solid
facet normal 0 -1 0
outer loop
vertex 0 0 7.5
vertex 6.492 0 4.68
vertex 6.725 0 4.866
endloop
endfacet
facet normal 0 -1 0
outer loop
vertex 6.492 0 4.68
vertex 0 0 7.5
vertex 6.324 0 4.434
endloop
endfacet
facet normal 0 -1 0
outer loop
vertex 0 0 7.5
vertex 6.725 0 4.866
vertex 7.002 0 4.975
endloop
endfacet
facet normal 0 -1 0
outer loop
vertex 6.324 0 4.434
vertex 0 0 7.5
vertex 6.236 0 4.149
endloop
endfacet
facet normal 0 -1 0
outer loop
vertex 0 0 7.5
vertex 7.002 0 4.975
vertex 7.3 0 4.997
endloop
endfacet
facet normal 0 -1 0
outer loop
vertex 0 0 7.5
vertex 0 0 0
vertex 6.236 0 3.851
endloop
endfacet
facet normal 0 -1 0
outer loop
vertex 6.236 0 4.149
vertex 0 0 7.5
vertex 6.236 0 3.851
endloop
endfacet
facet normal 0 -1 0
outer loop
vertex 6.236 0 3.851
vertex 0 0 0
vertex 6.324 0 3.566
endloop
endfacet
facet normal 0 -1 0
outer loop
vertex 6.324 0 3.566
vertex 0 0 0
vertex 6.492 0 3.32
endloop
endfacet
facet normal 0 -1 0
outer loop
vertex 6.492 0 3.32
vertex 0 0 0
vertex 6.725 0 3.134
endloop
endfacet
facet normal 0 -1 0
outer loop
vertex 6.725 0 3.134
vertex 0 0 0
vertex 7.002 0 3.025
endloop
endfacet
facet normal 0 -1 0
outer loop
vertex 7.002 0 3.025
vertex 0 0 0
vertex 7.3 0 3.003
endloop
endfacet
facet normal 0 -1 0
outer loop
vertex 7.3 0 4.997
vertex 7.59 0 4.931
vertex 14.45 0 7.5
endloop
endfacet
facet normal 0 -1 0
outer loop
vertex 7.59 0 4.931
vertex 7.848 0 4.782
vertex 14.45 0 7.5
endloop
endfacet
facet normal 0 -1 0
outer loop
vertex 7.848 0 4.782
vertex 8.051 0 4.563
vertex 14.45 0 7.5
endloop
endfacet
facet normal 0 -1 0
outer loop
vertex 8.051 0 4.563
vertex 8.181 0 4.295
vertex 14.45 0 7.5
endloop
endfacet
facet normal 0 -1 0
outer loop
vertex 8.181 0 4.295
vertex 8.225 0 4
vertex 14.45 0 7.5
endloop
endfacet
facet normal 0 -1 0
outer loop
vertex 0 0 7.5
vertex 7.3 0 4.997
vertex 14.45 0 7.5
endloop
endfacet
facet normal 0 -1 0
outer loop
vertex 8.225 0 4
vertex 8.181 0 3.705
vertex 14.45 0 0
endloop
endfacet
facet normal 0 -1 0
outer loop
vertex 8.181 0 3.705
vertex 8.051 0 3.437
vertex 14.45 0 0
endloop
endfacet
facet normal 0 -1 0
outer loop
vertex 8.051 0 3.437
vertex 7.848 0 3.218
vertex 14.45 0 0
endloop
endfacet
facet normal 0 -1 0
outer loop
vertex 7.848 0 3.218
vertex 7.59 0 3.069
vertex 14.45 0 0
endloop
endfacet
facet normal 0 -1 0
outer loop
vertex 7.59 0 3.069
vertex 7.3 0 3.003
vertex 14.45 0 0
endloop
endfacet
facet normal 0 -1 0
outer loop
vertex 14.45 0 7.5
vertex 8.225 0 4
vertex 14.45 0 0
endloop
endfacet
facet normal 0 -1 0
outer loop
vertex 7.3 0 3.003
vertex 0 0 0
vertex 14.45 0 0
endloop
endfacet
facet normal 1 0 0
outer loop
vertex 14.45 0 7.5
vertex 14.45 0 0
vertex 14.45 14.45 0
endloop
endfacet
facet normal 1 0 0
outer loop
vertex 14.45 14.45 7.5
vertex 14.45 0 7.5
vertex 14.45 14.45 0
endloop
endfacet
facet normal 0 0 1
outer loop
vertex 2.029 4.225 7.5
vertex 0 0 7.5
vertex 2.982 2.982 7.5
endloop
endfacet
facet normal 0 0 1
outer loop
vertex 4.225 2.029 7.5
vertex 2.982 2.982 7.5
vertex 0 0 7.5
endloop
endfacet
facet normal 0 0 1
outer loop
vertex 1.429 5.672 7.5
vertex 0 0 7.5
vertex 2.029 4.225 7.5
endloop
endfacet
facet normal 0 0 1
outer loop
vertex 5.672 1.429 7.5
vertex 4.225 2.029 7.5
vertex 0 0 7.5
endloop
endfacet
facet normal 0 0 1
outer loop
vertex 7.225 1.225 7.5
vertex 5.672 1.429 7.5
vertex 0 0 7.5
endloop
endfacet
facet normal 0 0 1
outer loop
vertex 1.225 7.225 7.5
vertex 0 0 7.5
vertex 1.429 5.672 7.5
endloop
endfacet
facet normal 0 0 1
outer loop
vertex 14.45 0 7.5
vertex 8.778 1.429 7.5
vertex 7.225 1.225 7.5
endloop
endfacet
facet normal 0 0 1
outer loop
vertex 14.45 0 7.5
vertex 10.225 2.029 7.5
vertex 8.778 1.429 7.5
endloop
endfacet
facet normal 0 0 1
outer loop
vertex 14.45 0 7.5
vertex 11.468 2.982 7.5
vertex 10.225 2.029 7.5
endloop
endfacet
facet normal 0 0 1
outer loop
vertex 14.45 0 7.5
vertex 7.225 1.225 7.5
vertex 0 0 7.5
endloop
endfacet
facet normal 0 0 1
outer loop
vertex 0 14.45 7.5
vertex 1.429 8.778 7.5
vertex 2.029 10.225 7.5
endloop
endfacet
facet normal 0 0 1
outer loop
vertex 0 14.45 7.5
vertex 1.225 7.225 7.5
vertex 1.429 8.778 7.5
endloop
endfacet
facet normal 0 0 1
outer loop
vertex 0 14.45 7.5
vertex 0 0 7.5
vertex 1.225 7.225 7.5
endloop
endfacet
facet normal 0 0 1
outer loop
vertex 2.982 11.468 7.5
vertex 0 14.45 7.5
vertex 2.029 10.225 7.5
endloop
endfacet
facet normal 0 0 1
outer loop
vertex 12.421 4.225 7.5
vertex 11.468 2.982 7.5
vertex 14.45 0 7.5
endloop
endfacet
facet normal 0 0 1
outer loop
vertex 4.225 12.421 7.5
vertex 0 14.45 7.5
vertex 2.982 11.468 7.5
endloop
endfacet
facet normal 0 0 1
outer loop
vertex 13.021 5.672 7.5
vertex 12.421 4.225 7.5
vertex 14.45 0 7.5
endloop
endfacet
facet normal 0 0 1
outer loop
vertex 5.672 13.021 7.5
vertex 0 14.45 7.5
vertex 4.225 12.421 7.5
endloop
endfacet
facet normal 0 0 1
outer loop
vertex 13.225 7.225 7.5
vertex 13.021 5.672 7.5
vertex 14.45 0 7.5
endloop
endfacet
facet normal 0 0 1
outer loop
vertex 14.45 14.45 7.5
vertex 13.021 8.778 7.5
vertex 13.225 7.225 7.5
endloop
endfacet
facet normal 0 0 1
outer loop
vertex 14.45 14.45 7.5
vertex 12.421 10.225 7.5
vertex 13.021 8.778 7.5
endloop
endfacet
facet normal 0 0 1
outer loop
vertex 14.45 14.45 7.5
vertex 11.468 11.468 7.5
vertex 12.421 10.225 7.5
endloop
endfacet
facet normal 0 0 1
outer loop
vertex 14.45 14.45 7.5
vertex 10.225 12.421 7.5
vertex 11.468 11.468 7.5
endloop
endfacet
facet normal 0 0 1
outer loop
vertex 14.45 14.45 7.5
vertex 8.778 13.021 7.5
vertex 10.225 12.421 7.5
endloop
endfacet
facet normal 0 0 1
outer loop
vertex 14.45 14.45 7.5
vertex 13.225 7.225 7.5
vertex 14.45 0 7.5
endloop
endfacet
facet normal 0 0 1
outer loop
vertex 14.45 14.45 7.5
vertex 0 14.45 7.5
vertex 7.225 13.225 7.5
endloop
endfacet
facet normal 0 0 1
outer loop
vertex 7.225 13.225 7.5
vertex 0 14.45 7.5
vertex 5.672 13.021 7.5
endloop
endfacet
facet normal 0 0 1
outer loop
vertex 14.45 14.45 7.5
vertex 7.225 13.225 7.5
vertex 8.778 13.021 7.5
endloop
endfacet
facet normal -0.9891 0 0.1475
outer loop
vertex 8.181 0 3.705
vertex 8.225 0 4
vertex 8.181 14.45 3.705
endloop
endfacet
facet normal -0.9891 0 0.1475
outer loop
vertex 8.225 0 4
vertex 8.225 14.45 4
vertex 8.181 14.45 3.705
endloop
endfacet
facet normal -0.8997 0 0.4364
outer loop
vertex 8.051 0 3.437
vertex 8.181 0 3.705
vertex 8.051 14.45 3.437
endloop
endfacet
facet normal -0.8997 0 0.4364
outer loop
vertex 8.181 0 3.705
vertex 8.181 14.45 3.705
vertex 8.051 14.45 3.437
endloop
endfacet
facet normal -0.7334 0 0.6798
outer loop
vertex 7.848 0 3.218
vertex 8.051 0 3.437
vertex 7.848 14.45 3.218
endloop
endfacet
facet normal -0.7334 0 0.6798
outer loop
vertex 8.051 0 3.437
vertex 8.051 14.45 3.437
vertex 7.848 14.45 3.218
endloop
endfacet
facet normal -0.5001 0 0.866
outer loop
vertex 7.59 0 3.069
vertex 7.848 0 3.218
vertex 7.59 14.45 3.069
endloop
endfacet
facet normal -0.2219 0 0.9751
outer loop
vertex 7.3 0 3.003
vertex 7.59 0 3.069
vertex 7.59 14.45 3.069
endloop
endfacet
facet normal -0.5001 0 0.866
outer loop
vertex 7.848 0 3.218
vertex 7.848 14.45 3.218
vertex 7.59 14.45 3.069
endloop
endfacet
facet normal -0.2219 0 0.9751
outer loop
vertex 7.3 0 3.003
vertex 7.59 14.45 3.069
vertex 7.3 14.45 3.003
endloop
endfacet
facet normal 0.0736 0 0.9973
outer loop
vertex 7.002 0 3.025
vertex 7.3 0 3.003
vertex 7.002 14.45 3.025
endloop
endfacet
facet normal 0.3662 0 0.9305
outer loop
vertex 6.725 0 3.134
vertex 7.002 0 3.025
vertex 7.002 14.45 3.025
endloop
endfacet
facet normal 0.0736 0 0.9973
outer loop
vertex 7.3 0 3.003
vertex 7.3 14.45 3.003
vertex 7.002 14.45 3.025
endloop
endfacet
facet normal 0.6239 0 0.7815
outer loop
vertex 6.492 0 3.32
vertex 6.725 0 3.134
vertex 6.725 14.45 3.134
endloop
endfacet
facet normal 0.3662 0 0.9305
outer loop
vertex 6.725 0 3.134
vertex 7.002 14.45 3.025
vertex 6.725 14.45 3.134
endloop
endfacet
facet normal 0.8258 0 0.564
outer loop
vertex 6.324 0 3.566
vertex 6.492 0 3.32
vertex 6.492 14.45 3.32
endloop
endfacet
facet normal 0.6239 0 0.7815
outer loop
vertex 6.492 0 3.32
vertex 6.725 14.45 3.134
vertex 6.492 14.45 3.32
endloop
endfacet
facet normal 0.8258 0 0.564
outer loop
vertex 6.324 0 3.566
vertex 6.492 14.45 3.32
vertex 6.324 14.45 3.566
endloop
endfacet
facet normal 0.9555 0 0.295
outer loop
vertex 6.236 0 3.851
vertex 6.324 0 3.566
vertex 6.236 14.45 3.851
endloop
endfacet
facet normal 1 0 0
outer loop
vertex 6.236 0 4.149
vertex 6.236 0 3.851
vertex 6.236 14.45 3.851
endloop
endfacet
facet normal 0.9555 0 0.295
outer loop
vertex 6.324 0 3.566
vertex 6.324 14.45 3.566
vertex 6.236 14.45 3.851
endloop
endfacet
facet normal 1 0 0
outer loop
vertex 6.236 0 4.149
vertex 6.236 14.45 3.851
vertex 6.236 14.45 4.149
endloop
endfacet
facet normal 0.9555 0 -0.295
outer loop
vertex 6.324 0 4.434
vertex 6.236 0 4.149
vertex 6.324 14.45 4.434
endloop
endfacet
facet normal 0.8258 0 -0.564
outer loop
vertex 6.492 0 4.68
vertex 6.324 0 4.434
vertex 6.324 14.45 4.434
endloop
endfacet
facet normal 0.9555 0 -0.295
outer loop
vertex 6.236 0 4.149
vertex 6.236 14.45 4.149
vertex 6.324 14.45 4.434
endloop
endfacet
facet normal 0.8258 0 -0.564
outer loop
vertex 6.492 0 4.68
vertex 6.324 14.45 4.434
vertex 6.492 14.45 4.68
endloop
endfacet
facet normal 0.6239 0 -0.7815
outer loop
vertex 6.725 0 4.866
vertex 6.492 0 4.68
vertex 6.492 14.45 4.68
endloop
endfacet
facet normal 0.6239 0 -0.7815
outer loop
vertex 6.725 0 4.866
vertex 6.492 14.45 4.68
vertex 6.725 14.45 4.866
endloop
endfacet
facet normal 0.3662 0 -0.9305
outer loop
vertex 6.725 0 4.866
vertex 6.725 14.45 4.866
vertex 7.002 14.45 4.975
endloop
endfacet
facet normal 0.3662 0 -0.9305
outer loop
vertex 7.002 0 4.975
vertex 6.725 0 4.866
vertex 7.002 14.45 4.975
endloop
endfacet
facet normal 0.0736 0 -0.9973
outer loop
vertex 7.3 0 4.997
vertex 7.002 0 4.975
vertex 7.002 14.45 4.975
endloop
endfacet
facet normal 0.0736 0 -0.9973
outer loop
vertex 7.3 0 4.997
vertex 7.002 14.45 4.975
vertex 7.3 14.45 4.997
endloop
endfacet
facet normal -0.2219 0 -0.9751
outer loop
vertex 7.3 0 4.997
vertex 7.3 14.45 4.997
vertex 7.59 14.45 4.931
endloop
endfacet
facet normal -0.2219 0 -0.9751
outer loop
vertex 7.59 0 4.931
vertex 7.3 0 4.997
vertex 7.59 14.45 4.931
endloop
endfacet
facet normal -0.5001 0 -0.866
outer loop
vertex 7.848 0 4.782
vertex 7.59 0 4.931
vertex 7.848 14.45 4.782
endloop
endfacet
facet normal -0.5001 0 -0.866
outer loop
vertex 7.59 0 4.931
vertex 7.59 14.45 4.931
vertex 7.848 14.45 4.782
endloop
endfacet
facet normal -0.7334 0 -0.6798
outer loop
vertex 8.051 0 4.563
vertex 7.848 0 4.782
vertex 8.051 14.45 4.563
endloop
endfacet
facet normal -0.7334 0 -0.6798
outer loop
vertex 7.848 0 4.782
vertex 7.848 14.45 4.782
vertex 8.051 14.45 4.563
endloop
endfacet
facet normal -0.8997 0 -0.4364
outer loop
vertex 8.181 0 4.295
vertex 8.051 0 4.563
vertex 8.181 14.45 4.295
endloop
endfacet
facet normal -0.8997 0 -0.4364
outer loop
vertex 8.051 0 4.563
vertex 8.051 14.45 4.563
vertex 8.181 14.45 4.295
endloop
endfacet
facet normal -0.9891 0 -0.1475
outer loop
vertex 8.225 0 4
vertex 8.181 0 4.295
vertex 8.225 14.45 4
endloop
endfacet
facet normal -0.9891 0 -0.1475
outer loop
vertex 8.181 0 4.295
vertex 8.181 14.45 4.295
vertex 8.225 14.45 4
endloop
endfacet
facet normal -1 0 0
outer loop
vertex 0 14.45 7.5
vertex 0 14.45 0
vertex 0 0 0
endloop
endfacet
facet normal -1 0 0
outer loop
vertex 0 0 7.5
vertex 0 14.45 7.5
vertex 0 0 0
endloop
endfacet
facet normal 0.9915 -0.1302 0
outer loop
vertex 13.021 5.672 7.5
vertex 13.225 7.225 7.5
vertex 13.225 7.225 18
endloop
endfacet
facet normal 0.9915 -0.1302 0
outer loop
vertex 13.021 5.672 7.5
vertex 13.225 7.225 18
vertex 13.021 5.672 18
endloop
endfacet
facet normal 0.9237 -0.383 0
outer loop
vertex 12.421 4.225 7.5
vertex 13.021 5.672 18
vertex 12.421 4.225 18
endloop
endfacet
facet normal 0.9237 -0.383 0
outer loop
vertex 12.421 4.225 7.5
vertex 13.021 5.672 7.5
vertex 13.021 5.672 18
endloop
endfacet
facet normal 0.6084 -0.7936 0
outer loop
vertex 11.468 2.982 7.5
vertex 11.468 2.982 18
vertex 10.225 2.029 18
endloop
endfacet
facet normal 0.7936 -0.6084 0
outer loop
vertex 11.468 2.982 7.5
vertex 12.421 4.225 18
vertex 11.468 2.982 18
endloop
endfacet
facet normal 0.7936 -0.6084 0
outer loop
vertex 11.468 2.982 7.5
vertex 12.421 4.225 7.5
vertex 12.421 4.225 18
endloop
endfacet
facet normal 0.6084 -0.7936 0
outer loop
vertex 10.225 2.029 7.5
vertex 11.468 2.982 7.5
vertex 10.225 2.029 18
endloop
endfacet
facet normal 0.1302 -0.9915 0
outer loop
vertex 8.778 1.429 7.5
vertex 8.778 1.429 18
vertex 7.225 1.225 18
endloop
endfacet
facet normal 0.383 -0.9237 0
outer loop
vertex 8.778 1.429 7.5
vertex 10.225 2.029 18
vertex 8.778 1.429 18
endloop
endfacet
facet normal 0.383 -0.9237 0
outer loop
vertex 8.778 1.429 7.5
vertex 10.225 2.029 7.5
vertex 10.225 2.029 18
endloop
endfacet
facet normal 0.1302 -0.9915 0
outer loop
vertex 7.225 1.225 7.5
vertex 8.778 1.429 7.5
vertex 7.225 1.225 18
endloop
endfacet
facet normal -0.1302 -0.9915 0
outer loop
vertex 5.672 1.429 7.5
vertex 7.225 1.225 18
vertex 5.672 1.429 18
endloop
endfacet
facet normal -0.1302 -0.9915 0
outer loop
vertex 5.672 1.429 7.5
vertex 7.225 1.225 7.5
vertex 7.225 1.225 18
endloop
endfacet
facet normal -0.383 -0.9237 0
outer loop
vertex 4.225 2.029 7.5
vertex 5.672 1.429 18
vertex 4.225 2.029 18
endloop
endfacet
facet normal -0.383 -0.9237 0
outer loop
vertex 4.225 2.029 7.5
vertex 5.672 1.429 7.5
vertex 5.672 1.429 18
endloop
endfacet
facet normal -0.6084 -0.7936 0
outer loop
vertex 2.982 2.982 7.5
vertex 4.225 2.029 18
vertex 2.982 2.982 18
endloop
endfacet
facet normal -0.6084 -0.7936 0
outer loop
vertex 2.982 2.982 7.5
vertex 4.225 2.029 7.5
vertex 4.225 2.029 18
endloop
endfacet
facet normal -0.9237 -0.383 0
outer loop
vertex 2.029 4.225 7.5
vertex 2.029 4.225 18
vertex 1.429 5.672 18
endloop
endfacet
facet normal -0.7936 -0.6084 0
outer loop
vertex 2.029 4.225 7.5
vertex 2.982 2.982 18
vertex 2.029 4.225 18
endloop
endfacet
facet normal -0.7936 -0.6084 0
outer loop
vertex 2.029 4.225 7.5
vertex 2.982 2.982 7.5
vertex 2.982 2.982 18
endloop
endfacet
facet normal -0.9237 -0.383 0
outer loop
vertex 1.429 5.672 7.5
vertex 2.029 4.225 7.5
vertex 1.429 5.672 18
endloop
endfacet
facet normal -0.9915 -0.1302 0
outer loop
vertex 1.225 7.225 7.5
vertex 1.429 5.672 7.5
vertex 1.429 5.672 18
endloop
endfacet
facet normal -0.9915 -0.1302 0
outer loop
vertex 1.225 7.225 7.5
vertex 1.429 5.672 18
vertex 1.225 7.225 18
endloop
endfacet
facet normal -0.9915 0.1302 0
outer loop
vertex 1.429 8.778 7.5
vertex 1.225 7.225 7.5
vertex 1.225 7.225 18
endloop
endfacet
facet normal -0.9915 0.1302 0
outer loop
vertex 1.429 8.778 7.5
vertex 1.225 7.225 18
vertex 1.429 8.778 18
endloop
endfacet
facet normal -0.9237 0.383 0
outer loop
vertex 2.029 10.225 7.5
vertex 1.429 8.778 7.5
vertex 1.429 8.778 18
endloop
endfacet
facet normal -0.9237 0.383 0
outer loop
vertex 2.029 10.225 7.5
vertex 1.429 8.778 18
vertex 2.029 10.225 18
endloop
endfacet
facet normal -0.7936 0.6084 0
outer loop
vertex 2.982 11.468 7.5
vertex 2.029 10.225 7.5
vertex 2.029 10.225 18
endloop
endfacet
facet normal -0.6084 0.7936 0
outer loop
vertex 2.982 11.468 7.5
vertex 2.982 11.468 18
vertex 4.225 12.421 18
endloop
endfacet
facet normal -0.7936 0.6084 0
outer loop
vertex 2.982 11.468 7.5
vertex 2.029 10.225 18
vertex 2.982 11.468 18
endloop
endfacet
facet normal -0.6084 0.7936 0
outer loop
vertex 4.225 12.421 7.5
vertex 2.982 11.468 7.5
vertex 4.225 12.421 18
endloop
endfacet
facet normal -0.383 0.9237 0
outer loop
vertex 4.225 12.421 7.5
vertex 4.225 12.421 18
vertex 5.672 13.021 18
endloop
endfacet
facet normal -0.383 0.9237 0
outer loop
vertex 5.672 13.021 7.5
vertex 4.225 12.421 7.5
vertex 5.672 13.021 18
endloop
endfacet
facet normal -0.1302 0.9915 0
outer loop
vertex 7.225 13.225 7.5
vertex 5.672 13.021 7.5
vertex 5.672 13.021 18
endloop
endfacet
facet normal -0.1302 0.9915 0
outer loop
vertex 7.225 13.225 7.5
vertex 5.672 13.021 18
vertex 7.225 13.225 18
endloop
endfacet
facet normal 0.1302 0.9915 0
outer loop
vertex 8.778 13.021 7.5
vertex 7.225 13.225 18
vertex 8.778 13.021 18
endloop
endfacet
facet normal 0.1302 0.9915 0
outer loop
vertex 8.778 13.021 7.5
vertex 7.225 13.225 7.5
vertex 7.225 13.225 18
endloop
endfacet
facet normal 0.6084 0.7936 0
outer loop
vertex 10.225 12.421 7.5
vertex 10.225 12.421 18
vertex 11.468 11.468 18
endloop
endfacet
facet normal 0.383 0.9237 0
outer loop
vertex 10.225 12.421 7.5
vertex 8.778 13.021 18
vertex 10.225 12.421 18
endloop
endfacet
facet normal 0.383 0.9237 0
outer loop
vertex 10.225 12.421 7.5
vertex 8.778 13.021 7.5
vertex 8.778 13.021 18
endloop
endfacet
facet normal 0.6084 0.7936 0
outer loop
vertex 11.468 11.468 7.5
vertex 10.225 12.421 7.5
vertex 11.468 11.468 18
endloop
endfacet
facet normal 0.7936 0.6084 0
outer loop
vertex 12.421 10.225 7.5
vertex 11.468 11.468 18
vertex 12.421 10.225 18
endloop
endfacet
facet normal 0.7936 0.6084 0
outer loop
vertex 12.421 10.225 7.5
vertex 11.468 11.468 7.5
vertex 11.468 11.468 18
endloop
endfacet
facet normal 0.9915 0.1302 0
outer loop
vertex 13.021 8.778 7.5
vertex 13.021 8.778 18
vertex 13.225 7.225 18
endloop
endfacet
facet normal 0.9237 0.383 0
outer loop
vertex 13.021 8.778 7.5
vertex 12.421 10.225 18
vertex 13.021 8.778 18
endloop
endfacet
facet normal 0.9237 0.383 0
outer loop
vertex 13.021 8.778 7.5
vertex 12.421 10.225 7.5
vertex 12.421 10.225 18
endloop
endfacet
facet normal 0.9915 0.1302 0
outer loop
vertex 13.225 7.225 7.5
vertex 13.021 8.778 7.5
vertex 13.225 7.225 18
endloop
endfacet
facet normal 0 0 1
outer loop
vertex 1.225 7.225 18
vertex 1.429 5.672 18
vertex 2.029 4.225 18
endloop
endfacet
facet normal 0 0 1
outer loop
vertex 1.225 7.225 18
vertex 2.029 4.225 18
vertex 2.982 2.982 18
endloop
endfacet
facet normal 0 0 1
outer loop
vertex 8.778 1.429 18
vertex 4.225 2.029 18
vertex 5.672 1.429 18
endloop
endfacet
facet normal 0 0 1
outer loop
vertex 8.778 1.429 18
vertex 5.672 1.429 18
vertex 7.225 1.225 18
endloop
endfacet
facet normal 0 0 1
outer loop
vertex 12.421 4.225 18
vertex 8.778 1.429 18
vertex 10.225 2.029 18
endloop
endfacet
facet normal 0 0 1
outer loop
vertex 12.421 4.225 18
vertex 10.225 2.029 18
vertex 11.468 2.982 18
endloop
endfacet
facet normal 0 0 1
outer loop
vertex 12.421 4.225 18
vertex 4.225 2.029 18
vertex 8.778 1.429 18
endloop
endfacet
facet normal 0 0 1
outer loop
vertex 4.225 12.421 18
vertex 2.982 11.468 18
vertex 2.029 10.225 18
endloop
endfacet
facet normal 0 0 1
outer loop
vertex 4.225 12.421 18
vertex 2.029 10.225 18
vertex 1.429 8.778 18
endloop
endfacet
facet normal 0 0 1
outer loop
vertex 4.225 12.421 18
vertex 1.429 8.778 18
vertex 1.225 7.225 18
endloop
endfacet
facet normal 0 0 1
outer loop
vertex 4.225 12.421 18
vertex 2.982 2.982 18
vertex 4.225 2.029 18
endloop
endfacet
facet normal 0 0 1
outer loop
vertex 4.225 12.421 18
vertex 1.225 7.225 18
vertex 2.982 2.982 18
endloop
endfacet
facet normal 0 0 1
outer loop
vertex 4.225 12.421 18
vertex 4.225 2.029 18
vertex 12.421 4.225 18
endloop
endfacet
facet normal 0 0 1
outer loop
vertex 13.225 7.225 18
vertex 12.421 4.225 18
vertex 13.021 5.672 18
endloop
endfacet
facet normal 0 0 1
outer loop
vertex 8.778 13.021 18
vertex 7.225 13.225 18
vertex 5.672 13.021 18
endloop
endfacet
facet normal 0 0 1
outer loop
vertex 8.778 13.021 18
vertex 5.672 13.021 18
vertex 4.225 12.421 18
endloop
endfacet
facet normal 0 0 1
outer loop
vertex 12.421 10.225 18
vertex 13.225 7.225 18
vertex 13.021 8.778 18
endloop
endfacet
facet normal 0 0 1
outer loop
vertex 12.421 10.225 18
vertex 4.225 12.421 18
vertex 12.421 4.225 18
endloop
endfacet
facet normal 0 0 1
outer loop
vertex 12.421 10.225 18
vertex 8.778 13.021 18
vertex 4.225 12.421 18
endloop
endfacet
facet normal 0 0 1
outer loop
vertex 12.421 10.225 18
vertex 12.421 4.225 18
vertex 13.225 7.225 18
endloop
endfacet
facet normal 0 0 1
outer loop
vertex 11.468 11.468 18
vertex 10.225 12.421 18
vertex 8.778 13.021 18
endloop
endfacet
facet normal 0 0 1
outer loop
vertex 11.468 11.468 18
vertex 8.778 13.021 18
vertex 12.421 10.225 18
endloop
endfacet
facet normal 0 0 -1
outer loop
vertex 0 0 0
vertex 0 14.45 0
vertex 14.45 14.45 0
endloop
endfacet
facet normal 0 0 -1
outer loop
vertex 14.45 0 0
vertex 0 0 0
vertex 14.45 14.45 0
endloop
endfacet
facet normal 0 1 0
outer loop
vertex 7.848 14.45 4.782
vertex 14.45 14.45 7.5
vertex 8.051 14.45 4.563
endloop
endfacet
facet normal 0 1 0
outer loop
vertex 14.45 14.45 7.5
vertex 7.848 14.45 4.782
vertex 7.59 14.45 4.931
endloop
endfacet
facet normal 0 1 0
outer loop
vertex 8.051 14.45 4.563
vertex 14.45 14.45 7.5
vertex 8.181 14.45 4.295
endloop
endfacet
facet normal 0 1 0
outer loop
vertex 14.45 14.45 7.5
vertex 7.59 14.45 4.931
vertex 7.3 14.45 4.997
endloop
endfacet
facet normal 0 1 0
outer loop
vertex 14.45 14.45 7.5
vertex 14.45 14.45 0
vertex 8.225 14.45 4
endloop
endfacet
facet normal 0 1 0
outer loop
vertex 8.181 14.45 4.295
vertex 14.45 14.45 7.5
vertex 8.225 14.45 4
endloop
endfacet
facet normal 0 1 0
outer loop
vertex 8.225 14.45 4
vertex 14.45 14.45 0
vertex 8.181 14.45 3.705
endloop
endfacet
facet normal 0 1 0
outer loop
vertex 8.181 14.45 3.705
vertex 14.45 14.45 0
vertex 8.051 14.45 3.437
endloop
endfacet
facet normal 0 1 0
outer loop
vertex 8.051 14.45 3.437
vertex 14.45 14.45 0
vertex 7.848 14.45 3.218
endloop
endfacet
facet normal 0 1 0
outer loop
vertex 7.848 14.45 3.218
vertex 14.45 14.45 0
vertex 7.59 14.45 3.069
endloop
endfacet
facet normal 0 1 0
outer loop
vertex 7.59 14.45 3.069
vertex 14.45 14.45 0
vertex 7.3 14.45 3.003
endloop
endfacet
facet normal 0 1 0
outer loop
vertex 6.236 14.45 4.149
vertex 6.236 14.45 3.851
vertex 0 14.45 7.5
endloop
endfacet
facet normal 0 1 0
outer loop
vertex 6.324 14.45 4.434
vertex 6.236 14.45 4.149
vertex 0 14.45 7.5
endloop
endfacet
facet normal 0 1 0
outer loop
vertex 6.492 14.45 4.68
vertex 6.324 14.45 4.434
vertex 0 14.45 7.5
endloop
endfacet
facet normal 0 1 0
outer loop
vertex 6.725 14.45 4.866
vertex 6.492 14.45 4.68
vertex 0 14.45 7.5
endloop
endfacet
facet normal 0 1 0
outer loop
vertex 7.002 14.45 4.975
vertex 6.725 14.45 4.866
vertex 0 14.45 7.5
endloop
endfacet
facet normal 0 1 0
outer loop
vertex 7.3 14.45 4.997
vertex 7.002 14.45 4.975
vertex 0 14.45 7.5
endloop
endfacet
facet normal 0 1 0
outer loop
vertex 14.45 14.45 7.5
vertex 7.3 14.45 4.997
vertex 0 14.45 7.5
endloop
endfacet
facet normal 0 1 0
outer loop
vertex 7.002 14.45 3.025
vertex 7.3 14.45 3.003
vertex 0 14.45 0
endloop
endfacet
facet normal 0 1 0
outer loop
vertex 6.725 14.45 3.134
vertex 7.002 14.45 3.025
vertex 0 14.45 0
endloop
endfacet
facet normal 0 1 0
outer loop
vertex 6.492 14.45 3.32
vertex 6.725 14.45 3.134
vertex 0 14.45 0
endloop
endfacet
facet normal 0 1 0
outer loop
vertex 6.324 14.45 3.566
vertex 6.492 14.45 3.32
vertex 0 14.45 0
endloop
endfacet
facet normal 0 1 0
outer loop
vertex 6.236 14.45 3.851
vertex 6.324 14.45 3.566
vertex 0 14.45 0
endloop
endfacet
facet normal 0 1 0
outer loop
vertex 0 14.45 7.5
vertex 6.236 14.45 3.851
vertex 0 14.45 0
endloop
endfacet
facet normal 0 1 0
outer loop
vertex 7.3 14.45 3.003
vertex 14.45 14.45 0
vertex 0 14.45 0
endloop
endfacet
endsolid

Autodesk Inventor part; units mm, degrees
ref_plane "YZ Plane" through (0, 0, 0) normal (1, 0, 0) x (0, 1, 0)
ref_plane "XZ Plane" through (0, 0, 0) normal (0, 1, 0) x (-1, 0, 0)
ref_plane "XY Plane" through (0, 0, 0) normal (0, 0, 1) x (1, 0, 0)
sketch "Sketch1" plane through (0, 0, 0) normal (0, 0, 1) x (1, 0, 0)
  line L0 (0, 0) -> (14.45, 0)
  line L1 (14.45, 0) -> (14.45, 14.45)
  line L2 (14.45, 14.45) -> (0, 14.45)
  line L3 (0, 14.45) -> (0, 0)
  dimension "d0" = 14.45
  dimension "d1" = 14.45
extrude "Extrusion1" add sketch "Sketch1" along normal blind 7.5
sketch "Sketch6" plane through (0, 0, 7.5) normal (0, 0, 1) x (1, 0, 0)
  line L0 (14.45, 0) -> (14.45, 14.45) construction
  line L1 (14.45, 7.225) -> (0, 7.225) construction
  line L2 (0, 14.45) -> (0, 0) construction
  circle A0 centre (7.225, 7.225) radius 6
  dimension "d14" = 12
sketch "Sketch7" plane through (0, 0, 0) normal (-1, 0, 0) x (0, 0, 1)
  line L0 (0, 14.45) -> (0, 0) projected
  line L1 (0, 0) -> (7.5, 0) projected
  line L2 (7.5, 14.45) -> (7.5, 0) projected
  line L3 (0, 14.45) -> (7.5, 14.45) projected
  dimension "d15" = 7.5
extrude "Extrusion4" add sketch "Sketch6" along normal blind 10.5
sketch "Sketch8" plane through (0, 14.45, 0) normal (0, 1, 0) x (1, 0, 0)
  line L0 (14.45, 0) -> (0, 0) projected
  line L1 (0, 0) -> (14.45, 0) construction
  line L2 (7.225, 0) -> (7.225, -5) construction
  line L3 (7.225, -5) -> (9.4124, -5) construction
  circle A0 centre (7.225, -4) radius 1
  dimension "d18" = 5
  dimension "d19" = 2
extrude "Extrusion5" cut sketch "Sketch8" against normal up to surface (14.45 mm away)
sketch "Sketch10" plane through (0, 14.45, 0) normal (0, 1, 0) x (1, 0, 0)
  circle A0 centre (7.225, -4) radius 1 projected
  line L0 (7.225, -4) -> (7.225, -117.6084)
  line L1 (-3.4196, -20.1658) -> (-107.1714, -68.5461)
  line L2 (1.225, -18) -> (13.225, -18) projected
  line L3 (13.225, -18) -> (159.9004, -86.3959)
  point P0 (0, 0)
  dimension "d22" = 130
properties part number "HDzero runcam nano spacer"
